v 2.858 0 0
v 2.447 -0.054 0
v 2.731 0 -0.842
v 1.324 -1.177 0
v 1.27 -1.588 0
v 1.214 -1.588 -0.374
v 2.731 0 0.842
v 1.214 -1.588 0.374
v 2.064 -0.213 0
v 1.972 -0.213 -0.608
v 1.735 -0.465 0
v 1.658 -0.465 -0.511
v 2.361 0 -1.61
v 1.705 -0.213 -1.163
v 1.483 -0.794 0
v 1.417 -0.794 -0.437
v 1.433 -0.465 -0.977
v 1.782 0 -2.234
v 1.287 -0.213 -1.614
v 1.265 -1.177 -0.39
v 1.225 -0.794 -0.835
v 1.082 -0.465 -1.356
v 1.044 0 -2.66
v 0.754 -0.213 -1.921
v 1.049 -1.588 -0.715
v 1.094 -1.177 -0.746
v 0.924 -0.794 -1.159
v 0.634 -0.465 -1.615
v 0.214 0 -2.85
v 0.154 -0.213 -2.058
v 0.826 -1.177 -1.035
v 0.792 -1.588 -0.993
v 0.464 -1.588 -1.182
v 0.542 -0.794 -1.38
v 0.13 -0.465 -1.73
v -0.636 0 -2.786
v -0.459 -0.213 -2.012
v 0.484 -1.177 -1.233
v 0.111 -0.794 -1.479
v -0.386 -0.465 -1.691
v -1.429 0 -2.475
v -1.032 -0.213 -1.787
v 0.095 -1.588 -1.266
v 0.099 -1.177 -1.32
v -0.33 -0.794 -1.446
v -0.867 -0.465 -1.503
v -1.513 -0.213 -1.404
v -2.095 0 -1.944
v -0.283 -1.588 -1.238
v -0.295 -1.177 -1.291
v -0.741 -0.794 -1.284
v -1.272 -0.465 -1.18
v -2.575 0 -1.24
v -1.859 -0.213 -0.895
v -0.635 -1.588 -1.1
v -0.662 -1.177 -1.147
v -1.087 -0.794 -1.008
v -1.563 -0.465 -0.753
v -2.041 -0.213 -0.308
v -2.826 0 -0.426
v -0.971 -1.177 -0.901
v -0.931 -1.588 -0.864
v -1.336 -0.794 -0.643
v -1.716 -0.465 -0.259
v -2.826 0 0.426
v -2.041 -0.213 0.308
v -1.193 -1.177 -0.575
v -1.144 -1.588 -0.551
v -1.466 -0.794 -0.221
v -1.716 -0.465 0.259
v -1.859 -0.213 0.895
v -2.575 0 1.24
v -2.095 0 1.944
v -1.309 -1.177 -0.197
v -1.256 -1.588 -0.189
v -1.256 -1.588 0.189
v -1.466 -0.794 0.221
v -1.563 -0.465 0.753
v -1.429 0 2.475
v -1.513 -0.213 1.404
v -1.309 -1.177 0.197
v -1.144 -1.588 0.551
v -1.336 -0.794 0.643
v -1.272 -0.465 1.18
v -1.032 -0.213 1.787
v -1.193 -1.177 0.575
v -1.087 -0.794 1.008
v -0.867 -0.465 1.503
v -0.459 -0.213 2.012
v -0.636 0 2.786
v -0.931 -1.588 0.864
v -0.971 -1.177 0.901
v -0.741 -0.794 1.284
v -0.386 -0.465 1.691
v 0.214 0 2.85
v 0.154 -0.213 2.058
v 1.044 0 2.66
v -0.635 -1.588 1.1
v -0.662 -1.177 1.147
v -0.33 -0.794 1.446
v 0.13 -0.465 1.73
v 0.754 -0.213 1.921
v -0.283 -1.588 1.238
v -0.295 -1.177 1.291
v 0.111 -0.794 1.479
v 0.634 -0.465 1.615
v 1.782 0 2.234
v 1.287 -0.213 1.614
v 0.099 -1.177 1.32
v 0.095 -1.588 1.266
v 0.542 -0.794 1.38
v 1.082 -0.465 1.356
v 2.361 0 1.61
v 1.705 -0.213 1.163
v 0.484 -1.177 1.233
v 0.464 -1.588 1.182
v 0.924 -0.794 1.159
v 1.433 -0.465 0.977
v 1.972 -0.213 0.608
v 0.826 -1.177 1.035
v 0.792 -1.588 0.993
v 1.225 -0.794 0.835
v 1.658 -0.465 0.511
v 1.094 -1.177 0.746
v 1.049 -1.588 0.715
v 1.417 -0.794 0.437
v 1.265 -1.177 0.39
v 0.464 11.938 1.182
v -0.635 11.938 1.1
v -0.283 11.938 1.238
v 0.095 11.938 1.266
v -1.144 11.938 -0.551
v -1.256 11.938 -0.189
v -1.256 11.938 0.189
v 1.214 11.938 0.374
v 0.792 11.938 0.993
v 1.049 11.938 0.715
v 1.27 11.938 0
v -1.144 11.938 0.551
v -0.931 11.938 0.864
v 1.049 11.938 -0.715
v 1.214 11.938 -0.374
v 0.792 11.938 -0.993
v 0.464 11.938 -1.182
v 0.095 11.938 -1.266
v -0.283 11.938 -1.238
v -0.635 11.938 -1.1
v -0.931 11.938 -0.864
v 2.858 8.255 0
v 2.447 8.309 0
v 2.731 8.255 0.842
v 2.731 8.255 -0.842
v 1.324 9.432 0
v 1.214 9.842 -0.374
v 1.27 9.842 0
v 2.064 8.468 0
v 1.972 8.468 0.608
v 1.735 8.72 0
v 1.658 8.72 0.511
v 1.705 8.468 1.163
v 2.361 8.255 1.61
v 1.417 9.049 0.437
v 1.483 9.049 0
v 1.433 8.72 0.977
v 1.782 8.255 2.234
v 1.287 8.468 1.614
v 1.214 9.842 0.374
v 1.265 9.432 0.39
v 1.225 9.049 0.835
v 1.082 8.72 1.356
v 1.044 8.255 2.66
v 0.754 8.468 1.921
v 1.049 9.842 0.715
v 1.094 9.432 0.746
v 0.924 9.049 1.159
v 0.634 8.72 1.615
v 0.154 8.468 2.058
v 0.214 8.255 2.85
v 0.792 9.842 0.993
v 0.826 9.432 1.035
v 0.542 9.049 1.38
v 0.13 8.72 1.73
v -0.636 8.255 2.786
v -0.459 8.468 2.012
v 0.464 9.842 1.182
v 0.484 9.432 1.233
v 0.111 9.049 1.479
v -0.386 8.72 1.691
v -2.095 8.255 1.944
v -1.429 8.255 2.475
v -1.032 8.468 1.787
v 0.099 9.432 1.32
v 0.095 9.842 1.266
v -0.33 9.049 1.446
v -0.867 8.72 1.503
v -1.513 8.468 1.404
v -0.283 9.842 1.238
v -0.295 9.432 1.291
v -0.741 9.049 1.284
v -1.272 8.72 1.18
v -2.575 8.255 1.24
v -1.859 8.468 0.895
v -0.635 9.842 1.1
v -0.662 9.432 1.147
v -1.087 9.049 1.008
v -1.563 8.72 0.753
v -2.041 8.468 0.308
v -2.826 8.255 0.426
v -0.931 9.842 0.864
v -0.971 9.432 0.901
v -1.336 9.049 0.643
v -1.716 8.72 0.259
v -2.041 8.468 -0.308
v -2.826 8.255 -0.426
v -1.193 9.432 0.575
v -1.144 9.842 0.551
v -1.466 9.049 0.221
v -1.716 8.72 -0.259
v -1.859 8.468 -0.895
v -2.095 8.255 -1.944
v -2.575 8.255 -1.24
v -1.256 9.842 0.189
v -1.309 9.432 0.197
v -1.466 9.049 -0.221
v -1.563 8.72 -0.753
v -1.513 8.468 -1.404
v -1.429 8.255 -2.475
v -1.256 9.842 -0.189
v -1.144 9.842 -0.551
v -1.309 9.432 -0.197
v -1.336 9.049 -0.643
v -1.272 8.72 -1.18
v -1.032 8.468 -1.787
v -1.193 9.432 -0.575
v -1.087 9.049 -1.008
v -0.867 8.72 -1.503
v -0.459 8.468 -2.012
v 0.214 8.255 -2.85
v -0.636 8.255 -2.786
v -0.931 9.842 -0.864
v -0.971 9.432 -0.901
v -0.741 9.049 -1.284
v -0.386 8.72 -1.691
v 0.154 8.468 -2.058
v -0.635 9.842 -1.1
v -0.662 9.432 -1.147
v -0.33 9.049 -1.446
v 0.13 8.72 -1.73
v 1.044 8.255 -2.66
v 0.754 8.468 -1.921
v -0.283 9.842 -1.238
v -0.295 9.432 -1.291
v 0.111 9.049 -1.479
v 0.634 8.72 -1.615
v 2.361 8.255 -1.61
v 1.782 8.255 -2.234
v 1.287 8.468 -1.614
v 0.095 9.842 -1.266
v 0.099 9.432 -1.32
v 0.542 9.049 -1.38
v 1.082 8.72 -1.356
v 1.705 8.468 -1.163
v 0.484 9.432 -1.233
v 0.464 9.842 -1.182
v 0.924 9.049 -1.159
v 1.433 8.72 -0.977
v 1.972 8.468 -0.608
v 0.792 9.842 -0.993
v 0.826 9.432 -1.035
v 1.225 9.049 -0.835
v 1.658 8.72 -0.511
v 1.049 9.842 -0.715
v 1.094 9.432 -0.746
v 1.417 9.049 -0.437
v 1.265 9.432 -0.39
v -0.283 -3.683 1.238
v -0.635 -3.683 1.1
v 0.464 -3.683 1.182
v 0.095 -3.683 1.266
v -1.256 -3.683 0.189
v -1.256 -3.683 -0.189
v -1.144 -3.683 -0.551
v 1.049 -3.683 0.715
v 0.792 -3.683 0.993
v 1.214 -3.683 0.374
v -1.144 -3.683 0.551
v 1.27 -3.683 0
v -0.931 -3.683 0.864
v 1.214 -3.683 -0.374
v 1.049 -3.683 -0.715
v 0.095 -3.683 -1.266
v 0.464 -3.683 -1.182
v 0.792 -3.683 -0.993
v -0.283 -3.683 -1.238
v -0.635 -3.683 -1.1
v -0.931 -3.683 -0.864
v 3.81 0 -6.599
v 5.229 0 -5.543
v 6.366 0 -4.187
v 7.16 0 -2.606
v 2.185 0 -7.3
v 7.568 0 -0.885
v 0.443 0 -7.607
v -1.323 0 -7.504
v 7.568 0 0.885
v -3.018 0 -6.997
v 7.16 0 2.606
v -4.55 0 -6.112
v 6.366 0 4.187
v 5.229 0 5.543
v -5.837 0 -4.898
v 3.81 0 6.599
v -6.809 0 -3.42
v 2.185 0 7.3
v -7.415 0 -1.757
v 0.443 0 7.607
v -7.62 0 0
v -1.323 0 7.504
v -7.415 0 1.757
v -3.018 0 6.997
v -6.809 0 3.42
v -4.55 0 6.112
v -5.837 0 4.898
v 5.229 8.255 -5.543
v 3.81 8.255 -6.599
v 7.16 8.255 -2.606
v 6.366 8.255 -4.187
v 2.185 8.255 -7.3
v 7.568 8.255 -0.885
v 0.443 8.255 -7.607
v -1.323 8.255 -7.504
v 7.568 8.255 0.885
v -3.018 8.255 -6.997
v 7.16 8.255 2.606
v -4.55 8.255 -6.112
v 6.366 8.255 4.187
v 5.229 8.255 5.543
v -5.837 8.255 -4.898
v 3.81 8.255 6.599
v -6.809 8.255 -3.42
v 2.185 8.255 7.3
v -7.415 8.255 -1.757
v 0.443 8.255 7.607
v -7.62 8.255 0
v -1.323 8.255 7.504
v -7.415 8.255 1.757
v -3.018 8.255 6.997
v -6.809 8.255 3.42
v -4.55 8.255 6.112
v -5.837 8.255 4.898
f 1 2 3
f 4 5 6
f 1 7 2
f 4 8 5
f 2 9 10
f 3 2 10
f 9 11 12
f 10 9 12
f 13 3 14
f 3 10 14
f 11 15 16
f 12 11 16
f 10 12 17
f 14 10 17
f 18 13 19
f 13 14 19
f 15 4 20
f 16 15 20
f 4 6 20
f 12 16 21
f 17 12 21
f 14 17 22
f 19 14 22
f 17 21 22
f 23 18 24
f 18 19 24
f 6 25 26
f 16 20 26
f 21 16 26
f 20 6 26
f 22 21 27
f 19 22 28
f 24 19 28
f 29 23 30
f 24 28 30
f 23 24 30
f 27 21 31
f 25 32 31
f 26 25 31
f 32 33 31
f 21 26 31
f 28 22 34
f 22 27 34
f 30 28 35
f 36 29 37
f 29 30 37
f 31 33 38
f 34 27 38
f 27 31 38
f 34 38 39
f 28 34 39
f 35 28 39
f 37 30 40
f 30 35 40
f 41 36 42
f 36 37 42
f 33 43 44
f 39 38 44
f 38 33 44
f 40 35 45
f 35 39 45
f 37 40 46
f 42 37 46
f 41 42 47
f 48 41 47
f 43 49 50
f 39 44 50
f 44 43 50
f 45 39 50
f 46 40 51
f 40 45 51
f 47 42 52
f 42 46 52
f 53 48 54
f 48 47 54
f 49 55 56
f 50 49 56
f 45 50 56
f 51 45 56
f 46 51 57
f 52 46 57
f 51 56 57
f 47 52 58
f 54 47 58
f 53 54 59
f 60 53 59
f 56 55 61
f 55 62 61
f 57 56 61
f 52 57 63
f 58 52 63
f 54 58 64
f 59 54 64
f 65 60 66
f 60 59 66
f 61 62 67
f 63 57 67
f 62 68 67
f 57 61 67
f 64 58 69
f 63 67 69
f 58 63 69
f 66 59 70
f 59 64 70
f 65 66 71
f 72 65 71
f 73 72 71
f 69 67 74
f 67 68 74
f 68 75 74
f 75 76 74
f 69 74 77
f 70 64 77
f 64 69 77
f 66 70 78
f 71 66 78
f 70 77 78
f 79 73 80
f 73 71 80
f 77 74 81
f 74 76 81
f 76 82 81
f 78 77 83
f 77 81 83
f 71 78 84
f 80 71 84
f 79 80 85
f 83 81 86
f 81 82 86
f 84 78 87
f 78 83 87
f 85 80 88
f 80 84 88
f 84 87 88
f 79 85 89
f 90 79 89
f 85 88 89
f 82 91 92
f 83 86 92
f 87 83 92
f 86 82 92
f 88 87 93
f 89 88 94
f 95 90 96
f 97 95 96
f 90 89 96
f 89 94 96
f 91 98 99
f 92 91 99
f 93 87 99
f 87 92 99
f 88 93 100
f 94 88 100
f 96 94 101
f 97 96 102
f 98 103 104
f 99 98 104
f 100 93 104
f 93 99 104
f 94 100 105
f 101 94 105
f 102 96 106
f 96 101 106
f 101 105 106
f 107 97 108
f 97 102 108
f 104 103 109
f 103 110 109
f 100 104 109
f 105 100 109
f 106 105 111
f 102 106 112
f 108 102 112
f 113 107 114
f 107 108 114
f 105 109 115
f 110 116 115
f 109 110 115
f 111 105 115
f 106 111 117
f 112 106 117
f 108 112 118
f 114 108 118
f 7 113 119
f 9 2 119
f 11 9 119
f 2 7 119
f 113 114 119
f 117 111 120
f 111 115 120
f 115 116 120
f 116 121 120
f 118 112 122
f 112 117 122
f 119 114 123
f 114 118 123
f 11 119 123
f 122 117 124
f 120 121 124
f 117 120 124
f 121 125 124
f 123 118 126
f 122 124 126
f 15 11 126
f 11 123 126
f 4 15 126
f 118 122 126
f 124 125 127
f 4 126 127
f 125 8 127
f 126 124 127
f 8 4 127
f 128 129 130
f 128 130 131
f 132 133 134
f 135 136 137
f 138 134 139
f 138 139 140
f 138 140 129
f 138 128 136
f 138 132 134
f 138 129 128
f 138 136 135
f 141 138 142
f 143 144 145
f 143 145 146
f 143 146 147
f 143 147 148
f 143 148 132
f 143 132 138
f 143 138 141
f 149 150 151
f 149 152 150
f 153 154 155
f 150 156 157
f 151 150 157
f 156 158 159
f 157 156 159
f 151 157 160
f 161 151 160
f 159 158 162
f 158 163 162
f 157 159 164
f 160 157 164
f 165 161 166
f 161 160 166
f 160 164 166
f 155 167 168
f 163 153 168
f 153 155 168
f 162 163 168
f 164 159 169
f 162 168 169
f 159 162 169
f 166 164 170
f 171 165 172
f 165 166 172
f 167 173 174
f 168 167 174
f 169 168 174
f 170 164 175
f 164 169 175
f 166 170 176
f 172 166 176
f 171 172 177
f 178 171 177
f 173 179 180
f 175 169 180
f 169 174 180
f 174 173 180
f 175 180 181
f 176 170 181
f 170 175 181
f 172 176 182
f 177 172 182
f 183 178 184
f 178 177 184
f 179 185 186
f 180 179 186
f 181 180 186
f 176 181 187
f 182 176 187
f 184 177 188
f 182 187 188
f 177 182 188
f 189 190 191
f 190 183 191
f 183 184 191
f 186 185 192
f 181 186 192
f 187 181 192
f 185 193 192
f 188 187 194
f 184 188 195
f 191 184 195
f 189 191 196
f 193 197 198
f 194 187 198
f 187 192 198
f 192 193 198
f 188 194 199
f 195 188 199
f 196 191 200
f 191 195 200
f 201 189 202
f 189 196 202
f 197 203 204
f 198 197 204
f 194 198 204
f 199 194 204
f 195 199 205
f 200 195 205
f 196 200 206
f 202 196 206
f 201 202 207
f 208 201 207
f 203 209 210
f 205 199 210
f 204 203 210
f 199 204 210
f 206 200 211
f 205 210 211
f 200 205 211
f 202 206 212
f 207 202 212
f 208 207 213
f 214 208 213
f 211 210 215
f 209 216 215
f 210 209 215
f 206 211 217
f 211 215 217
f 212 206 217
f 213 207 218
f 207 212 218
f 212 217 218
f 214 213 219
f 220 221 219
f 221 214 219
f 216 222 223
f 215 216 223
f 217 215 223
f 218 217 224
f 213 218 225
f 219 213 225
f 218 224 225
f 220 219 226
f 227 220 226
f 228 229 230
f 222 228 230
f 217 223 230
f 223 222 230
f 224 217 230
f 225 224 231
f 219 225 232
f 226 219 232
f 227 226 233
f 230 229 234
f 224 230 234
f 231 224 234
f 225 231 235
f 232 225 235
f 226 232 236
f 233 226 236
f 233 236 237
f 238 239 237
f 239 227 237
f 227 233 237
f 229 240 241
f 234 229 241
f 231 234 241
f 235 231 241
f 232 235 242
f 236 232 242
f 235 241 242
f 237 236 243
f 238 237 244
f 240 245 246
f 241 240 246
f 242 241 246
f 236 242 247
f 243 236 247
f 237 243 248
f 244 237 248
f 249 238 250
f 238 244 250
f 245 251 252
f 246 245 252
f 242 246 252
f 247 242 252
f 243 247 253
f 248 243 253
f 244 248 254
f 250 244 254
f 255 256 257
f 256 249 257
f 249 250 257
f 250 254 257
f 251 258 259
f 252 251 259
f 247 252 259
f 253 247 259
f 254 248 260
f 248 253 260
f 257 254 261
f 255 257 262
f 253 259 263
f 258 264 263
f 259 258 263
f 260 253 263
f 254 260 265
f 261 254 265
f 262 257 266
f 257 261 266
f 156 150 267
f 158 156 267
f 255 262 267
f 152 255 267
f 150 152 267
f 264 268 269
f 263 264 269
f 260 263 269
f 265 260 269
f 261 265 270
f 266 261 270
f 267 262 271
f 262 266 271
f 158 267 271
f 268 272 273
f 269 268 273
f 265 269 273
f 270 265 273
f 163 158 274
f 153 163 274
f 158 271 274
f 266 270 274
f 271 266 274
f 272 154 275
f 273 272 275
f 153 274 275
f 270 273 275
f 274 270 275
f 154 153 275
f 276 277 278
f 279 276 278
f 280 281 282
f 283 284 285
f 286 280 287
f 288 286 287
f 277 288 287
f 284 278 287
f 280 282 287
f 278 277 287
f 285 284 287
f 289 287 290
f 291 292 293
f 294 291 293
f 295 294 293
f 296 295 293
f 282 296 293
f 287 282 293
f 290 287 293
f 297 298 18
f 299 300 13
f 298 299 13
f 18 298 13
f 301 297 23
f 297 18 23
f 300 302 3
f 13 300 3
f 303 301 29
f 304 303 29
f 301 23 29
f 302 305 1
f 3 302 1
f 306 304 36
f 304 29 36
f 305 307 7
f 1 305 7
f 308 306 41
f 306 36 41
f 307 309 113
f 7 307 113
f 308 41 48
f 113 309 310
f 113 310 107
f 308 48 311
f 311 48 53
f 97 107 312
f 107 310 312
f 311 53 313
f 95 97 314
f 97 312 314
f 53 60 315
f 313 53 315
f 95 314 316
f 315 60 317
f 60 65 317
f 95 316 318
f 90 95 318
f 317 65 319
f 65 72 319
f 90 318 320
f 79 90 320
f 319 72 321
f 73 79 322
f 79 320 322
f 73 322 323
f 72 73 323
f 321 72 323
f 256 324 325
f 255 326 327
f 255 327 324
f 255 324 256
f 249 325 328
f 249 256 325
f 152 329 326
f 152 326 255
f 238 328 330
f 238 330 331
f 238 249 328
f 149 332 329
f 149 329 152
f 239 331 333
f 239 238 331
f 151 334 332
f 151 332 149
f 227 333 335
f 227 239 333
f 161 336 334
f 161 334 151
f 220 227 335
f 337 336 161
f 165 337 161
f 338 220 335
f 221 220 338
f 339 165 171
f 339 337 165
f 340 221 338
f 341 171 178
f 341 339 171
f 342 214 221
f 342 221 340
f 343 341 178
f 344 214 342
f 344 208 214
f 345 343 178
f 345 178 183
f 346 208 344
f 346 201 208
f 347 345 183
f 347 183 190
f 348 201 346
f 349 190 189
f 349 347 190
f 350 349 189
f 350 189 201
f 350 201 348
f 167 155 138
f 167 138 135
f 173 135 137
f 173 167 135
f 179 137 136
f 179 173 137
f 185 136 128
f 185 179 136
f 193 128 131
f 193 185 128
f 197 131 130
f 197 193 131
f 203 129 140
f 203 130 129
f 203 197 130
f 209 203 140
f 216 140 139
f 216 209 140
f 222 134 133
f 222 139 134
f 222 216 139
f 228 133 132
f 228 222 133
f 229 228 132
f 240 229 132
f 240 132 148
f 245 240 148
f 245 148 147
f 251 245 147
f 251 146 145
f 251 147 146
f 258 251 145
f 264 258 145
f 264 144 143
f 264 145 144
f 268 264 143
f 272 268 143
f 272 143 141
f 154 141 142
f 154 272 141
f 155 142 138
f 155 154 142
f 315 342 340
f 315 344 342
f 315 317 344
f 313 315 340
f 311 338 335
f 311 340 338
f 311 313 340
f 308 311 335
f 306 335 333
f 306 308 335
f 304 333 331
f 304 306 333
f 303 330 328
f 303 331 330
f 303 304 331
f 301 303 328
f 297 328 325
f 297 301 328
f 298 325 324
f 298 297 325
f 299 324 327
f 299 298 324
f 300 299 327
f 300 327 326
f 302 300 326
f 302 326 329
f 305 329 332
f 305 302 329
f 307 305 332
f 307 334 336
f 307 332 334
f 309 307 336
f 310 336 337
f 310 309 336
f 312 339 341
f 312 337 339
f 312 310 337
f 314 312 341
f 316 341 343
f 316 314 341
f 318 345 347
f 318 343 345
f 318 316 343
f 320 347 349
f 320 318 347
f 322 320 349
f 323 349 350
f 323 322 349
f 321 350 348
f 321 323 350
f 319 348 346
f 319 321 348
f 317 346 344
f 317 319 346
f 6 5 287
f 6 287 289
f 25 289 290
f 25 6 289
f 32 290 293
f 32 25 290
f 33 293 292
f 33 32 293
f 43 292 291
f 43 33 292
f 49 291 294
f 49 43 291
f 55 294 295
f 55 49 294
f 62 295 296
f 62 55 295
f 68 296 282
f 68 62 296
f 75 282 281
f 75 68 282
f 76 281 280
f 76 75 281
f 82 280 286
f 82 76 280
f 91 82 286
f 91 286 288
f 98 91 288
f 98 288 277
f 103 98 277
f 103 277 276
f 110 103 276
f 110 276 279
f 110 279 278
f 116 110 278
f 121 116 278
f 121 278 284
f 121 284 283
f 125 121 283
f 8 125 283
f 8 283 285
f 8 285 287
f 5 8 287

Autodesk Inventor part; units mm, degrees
ref_plane "YZ Plane" through (0, 0, 0) normal (1, 0, 0) x (0, 1, 0)
ref_plane "XZ Plane" through (0, 0, 0) normal (0, 1, 0) x (-1, 0, 0)
ref_plane "XY Plane" through (0, 0, 0) normal (0, 0, 1) x (1, 0, 0)
sketch "Sketch1" plane through (0, 0, 0) normal (0, 1, 0) x (-1, 0, 0)
  circle A0 centre (0, 0) radius 7.62
  dimension "d0" = 15.24
extrude "Extrusion1" add sketch "Sketch1" along normal blind 8.255
sketch "Sketch2" plane through (0, 8.255, 0) normal (0, 1, 0) x (1, 0, 0)
  circle A0 centre (0, 0) radius 7.62 projected
  circle A1 centre (0, 0) radius 1.27
  dimension "d3" = 2.54
extrude "Extrusion2" add sketch "Sketch2" along normal blind 3.683 and the other way blind 11.938 contours A1
fillet "Fillet1" radius 1.5875 2 edges at (-1.27, 0, 0) (-1.27, 8.255, 0)
sketch "Sketch3" plane through (0, 8.255, 0) normal (0, 1, 0) x (1, 0, 0)
  circle A0 centre (0, 0) radius 7.62 projected
  circle A1 centre (0, 0) radius 2.8575 projected
properties part number "X Pulley"
